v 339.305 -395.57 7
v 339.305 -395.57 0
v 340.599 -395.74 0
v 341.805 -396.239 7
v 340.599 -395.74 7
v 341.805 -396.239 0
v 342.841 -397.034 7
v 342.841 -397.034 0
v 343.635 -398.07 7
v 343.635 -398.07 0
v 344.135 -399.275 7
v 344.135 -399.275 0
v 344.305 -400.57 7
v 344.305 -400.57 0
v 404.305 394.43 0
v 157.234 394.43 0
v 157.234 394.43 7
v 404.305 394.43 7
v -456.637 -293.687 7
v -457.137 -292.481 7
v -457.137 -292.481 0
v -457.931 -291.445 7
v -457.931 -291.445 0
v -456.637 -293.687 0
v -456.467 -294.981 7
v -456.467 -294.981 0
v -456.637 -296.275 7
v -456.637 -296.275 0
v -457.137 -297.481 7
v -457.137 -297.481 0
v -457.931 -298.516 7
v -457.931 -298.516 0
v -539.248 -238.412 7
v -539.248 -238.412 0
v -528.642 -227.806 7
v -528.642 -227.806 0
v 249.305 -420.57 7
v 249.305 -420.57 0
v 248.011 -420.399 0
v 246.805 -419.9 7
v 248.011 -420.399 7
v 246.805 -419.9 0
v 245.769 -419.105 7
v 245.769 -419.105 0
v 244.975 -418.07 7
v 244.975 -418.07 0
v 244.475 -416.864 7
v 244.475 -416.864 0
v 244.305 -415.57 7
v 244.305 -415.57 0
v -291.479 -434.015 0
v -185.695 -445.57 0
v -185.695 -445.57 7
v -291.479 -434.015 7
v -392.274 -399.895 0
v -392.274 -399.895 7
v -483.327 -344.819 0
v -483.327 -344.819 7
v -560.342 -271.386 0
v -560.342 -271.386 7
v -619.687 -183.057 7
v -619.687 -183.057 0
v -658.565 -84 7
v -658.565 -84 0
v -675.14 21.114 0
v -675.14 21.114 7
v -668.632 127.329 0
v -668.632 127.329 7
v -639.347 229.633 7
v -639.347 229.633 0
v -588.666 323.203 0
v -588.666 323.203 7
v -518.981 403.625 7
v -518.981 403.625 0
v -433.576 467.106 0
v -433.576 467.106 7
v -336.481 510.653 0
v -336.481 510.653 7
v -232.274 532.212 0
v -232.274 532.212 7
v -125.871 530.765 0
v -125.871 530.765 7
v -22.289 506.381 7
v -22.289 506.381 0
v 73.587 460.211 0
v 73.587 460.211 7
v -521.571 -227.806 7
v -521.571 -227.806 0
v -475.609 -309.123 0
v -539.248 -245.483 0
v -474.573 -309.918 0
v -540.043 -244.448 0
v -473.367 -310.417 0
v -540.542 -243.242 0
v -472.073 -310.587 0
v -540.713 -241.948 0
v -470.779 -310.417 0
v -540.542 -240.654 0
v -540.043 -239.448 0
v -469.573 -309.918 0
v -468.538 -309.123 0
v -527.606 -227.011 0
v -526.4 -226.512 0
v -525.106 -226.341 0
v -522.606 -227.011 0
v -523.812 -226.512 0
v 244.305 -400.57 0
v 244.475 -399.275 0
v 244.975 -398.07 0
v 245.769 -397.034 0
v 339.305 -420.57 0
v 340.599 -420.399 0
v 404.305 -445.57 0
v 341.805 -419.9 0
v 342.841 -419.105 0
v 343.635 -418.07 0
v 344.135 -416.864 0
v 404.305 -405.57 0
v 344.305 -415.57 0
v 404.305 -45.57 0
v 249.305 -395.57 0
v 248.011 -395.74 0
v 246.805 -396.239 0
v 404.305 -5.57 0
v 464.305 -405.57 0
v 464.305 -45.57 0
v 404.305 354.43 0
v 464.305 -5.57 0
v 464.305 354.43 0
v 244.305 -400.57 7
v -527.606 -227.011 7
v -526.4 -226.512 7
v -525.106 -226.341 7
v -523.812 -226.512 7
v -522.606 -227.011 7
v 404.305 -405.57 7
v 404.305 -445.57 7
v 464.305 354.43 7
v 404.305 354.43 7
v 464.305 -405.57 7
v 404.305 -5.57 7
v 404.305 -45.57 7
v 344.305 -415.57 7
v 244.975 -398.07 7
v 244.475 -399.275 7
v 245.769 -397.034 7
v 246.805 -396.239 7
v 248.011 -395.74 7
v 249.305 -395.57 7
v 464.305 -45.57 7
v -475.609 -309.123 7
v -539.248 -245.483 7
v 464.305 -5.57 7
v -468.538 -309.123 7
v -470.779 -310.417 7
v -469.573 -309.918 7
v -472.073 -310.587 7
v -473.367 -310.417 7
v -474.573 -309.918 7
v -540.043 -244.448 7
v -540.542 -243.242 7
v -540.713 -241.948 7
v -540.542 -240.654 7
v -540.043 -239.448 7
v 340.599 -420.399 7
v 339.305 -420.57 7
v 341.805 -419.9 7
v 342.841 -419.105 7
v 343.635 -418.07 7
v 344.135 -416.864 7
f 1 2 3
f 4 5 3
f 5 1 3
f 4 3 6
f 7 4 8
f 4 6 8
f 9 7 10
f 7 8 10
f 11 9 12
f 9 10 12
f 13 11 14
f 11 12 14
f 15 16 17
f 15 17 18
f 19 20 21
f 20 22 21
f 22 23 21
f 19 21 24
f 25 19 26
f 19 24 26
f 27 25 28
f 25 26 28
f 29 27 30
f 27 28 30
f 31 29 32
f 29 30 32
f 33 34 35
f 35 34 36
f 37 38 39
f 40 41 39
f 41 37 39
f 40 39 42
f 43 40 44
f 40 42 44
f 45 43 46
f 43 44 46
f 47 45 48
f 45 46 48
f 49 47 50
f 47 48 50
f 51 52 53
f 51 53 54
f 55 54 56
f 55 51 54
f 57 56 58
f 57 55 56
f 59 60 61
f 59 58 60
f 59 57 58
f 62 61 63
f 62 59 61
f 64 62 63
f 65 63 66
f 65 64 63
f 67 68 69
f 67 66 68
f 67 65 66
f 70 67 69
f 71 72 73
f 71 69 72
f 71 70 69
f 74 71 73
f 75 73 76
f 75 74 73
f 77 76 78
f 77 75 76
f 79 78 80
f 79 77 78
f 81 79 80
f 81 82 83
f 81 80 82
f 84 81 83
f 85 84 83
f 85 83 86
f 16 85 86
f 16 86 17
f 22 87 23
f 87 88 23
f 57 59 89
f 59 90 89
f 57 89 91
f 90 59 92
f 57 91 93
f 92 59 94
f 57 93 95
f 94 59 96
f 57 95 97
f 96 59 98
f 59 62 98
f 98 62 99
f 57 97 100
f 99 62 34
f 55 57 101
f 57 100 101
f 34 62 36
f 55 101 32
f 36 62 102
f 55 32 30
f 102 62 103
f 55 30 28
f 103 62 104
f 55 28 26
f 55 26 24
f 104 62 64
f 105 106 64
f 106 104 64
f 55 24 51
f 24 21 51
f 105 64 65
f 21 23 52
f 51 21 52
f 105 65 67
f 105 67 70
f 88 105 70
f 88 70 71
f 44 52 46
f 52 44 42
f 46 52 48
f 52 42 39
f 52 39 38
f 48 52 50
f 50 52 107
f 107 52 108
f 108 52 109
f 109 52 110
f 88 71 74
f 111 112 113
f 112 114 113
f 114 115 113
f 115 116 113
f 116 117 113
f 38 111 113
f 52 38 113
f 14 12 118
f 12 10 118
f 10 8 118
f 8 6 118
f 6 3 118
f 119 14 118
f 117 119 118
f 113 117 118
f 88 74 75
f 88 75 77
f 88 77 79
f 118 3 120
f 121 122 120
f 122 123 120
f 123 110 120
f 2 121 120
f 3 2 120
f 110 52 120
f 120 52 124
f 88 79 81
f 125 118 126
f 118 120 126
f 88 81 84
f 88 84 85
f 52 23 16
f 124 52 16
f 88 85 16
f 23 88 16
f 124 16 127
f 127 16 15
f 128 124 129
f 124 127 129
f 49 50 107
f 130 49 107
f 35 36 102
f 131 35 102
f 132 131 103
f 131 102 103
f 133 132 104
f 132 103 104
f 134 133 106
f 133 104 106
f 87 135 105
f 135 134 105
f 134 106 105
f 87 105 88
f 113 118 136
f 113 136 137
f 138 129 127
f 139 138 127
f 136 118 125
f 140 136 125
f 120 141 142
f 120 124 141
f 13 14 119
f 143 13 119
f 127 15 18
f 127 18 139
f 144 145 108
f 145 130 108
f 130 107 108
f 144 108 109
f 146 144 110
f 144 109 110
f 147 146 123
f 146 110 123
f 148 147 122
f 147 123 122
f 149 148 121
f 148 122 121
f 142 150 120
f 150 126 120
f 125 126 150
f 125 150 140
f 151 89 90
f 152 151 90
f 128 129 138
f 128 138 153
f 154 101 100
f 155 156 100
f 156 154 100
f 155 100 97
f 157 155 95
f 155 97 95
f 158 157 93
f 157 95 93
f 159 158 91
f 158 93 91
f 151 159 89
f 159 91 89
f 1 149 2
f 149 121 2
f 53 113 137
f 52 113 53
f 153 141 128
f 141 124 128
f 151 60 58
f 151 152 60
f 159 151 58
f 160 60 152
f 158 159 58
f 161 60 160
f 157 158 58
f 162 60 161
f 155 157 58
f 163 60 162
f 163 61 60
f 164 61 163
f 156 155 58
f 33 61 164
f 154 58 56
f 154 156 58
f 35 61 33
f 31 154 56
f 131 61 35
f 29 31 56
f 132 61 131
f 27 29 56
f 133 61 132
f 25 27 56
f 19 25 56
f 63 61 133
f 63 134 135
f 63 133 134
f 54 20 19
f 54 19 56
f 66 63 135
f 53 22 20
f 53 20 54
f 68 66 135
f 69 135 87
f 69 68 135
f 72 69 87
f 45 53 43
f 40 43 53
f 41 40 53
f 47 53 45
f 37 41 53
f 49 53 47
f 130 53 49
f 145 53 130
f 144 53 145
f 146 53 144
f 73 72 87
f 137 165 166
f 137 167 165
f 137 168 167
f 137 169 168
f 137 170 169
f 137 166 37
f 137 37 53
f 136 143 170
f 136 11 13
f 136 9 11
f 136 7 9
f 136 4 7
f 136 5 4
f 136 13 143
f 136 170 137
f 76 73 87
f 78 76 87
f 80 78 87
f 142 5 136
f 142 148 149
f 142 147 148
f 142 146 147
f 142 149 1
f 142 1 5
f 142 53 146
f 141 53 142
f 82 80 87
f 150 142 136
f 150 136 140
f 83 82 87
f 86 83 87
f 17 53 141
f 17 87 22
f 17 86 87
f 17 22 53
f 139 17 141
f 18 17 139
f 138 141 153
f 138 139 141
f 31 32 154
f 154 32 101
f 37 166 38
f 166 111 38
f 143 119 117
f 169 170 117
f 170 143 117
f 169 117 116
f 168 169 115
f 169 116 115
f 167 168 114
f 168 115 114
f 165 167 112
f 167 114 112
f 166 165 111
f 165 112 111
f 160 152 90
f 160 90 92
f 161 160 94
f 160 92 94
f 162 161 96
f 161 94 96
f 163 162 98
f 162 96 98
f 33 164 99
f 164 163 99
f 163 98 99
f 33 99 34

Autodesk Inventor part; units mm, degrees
ref_plane "YZ Plane" through (0, 0, 0) normal (1, 0, 0) x (0, 1, 0)
ref_plane "XZ Plane" through (0, 0, 0) normal (0, 1, 0) x (-1, 0, 0)
ref_plane "XY Plane" through (0, 0, 0) normal (0, 0, 1) x (1, 0, 0)
ref_plane "Work Plane1" through (0, 0, 0) normal (0, 0, 1) x (1, 0, 0)
sketch "Sketch1" plane through (0, 0, 0) normal (0, 0, 1) x (1, 0, 0)
  arc A0 (157.2336, 394.4305) -> (-185.695, -445.5695) centre (-185.695, 44.4305) ccw construction
  line L0 (404.305, 394.4305) -> (404.305, 354.4305) construction
  line L1 (404.305, 354.4305) -> (524.305, 354.4305) construction
  line L2 (524.305, -5.5695) -> (404.305, -5.5695) construction
  line L3 (404.305, -5.5695) -> (404.305, -45.5695) construction
  line L4 (404.305, -45.5695) -> (524.305, -45.5695) construction
  line L5 (404.305, -405.5695) -> (404.305, -445.5695) construction
  line L6 (524.305, -405.5695) -> (404.305, -405.5695) construction
  line L7 (-185.695, -445.5695) -> (464.305, -445.5695) construction
  line L8 (404.305, 394.4305) -> (404.305, 354.4305)
  line L9 (464.305, 354.4305) -> (404.305, 354.4305)
  line L10 (404.305, -5.5695) -> (464.305, -5.5695)
  line L11 (404.305, -5.5695) -> (404.305, -45.5695)
  line L12 (464.305, -45.5695) -> (404.305, -45.5695)
  line L13 (404.305, -405.5695) -> (464.305, -405.5695)
  line L14 (404.305, -405.5695) -> (404.305, -445.5695)
  line L15 (464.305, 354.4305) -> (464.305, -5.5695)
  line L16 (464.305, -45.5695) -> (464.305, -405.5695)
  line L17 (404.305, -445.5695) -> (-185.695, -445.5695)
  line L18 (157.2336, 394.4305) -> (404.305, 394.4305)
  arc A1 (157.2336, 394.4305) -> (-185.695, -445.5695) centre (-185.695, 44.4305) ccw
  arc A2 (-521.5707, -227.8057) -> (-528.6418, -227.8057) centre (-525.1062, -231.3412) ccw projected
  line L19 (-539.2484, -238.4123) -> (-528.6418, -227.8057) projected
  arc A3 (-539.2484, -238.4123) -> (-539.2484, -245.4833) centre (-535.7128, -241.9478) ccw projected
  line L20 (-475.6088, -309.1229) -> (-539.2484, -245.4833) projected
  line L21 (-521.5707, -227.8057) -> (-457.9311, -291.4453) projected
  arc A4 (-457.9311, -298.5163) -> (-457.9311, -291.4453) centre (-461.4666, -294.9808) ccw projected
  arc A5 (-475.6088, -309.1229) -> (-468.5377, -309.1229) centre (-472.0732, -305.5874) ccw projected
  line L22 (-457.9311, -298.5163) -> (-468.5377, -309.1229) projected
  line L23 (249.305, -395.5695) -> (339.305, -395.5695) projected
  arc A6 (344.305, -400.5695) -> (339.305, -395.5695) centre (339.305, -400.5695) ccw projected
  line L24 (344.305, -400.5695) -> (344.305, -415.5695) projected
  arc A7 (339.305, -420.5695) -> (344.305, -415.5695) centre (339.305, -415.5695) ccw projected
  line L25 (339.305, -420.5695) -> (249.305, -420.5695) projected
  arc A8 (244.305, -415.5695) -> (249.305, -420.5695) centre (249.305, -415.5695) ccw projected
  line L26 (244.305, -415.5695) -> (244.305, -400.5695) projected
  arc A9 (249.305, -395.5695) -> (244.305, -400.5695) centre (249.305, -400.5695) ccw projected
  point P0 (0, 0)
extrude "Extrusion1" add sketch "Sketch1" along normal blind 7
properties part number "Foam_Right"
